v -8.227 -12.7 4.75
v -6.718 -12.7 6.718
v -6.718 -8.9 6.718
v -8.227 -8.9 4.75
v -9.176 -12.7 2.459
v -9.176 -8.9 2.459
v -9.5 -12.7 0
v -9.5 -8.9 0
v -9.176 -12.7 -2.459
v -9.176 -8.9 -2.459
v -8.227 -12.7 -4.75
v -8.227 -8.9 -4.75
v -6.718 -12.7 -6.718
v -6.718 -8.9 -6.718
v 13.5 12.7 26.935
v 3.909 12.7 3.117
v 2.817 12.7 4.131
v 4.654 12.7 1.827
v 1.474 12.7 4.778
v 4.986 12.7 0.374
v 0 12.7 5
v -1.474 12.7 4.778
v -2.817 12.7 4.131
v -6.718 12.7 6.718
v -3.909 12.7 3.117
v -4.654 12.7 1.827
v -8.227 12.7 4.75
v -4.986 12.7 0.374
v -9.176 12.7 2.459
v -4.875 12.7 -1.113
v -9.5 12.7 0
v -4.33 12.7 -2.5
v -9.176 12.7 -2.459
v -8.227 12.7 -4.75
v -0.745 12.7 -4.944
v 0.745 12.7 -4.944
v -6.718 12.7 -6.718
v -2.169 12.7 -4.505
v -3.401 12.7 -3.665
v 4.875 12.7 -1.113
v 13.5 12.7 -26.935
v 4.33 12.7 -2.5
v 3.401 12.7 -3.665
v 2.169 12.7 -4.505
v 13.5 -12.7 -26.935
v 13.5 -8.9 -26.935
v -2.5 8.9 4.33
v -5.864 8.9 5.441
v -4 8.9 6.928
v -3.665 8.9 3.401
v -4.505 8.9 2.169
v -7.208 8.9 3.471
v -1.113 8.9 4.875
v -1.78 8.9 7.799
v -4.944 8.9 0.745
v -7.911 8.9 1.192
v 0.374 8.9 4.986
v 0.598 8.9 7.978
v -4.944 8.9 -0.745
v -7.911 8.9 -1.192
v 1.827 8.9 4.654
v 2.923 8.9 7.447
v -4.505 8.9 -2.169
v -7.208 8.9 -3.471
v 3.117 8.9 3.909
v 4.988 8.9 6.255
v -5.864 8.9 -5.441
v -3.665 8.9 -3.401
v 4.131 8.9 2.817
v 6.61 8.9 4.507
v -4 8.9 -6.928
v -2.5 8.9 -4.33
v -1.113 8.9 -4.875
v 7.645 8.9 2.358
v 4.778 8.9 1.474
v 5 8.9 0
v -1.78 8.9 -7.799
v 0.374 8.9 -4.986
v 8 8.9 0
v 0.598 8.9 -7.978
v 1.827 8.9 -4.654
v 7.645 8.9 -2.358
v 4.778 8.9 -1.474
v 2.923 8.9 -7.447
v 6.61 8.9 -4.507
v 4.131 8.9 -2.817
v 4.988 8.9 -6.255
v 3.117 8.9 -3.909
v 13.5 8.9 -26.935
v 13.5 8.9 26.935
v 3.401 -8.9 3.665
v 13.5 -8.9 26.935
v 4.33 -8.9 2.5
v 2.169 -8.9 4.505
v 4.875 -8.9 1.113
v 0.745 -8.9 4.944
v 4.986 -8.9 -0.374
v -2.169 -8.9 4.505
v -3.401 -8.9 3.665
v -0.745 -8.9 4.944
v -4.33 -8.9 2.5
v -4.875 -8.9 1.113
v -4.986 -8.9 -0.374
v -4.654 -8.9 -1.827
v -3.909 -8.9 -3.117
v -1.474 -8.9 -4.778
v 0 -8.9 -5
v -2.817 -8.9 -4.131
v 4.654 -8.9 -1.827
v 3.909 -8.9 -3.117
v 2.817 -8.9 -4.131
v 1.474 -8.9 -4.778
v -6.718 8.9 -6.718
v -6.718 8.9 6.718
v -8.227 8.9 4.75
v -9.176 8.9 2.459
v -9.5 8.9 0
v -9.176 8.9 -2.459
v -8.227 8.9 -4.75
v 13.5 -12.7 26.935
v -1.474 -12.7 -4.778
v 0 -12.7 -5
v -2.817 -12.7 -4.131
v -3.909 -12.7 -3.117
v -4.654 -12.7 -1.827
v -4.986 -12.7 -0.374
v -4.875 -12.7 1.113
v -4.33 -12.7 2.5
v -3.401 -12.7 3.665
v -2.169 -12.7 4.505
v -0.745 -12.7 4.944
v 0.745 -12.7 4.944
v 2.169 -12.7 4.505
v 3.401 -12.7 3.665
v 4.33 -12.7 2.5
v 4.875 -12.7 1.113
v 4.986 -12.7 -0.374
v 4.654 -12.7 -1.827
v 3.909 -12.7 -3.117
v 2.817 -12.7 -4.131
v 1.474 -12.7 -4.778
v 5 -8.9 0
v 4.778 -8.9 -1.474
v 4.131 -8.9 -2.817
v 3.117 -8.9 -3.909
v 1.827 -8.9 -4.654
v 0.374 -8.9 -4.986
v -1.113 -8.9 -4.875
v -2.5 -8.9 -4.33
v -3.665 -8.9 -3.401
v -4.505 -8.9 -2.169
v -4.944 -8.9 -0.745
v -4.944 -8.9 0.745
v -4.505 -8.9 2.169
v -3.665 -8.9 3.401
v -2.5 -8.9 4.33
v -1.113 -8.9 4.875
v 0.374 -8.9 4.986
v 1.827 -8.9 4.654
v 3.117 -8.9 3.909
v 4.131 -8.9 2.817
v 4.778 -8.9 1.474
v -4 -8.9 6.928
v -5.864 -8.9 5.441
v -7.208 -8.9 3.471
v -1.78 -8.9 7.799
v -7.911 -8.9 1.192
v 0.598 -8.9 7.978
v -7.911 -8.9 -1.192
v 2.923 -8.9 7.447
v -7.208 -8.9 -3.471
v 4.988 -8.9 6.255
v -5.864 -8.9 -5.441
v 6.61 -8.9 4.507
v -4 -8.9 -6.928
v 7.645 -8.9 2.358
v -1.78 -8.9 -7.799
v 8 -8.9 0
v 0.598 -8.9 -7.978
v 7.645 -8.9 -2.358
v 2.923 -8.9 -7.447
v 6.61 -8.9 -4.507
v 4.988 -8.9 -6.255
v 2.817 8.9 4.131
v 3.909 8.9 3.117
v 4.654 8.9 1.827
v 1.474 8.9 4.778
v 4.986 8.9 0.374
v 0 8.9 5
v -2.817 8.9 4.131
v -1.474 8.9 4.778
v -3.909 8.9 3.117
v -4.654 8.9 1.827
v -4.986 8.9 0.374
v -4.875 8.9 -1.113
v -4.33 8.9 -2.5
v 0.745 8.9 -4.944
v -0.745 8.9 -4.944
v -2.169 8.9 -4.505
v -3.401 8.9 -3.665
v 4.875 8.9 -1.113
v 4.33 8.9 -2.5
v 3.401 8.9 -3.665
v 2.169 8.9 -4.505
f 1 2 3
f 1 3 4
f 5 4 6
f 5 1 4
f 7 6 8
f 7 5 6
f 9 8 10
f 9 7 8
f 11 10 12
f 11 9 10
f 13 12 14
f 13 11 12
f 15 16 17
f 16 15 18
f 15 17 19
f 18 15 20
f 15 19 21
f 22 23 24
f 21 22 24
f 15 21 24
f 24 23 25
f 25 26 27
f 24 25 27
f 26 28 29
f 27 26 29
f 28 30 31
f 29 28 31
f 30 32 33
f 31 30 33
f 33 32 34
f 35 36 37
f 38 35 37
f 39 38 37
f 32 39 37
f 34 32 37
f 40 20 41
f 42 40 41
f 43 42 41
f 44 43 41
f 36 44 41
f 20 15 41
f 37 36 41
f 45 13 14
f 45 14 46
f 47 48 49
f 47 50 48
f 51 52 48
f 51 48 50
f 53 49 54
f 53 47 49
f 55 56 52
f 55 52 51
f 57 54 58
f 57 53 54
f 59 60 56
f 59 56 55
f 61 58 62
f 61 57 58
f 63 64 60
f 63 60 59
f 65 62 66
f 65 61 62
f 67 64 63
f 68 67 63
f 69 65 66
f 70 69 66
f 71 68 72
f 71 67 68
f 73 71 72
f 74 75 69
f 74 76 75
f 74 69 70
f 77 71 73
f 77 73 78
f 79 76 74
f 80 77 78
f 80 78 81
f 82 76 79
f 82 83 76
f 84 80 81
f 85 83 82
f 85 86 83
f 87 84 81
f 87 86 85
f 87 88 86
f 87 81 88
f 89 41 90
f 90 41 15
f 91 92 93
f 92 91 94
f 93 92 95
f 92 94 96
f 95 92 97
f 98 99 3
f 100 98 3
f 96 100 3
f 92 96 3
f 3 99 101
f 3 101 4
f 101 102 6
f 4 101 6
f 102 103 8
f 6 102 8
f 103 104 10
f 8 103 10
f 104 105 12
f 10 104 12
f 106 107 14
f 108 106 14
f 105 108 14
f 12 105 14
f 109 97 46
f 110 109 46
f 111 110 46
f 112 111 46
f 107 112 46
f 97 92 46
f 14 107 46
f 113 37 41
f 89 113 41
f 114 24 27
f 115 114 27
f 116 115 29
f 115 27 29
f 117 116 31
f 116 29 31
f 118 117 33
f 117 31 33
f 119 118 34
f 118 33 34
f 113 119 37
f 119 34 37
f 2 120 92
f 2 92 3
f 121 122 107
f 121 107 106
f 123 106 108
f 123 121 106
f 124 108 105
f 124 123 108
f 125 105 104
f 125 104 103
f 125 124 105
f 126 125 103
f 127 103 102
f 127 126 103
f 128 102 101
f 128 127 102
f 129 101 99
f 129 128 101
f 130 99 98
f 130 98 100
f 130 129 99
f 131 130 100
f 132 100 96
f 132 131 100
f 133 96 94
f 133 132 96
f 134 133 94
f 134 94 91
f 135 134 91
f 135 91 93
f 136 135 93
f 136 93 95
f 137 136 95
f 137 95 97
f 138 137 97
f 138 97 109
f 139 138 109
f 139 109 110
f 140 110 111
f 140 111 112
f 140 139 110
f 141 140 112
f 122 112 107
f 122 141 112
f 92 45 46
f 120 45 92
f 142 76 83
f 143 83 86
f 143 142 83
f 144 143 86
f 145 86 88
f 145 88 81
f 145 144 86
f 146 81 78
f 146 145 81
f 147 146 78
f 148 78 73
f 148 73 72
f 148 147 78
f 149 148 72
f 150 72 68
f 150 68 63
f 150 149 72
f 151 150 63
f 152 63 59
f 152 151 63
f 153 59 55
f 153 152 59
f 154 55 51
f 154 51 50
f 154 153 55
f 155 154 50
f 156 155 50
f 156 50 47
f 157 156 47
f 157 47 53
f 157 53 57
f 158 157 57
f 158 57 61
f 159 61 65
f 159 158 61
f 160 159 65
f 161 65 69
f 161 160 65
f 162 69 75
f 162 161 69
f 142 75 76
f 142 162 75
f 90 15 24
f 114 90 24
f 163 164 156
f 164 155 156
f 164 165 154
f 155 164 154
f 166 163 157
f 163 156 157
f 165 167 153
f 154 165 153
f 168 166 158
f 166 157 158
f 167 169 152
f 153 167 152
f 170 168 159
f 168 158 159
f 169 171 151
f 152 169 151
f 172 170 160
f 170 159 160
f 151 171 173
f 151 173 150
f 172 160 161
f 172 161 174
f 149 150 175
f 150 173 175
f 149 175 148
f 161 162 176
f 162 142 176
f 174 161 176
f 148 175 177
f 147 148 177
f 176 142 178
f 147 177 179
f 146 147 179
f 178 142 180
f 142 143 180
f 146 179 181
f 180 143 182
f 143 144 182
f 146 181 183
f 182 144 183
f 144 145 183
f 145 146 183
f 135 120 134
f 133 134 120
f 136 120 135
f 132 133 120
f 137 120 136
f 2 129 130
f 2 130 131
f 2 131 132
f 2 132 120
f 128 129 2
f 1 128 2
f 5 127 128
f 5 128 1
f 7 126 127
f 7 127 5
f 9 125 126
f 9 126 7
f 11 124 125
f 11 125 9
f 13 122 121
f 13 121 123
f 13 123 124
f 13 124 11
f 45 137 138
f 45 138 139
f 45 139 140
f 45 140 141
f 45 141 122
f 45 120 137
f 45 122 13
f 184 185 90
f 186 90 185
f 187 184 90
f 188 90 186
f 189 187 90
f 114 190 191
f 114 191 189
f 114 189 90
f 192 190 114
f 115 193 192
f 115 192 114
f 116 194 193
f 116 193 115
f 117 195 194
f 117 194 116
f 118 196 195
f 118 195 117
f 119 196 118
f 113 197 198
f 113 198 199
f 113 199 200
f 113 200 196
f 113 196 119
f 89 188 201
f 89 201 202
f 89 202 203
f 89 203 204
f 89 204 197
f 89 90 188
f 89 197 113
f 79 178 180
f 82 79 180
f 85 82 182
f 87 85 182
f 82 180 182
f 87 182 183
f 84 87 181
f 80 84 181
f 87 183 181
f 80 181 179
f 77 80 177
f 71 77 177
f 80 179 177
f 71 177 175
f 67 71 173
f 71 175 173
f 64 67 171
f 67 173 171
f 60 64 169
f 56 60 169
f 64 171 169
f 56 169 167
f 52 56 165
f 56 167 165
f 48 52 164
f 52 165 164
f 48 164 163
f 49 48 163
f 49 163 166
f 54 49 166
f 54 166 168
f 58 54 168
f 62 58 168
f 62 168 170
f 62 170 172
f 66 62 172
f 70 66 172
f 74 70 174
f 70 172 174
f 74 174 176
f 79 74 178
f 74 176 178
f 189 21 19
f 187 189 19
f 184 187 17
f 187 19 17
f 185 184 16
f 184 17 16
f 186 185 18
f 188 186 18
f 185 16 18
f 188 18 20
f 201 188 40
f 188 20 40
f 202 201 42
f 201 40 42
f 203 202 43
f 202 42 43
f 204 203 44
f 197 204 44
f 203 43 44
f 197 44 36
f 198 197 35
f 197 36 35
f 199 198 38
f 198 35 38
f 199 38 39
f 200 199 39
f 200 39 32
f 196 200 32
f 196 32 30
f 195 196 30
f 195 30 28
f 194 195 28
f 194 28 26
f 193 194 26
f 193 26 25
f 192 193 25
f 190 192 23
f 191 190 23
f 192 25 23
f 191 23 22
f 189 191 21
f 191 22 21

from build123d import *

# Parameters (mm, degrees)
BOSS_EXTRUDE1_START       = 12.7
SKETCH1_R                 = 5
BOSS_EXTRUDE1_DEPTH       = 3.8
BOSS_EXTRUDE2_START       = -12.7
SKETCH1_2_R               = 5
BOSS_EXTRUDE2_DEPTH       = 3.8
BOSS_EXTRUDE3_START       = -8.9
BOSS_EXTRUDE3_OUTLINE_R   = 8
BOSS_EXTRUDE3_OUTLINE_R_2 = 5
BOSS_EXTRUDE3_DEPTH       = 17.8


# Read off the part's stored shape, not the designer's step: Boss-Extrude3
with BuildPart() as part:
    # Sketch1 → Boss-Extrude1 (new body)
    with BuildSketch(Plane(origin=(0, 0, 0), x_dir=(1, 0, 0), z_dir=(0, 1, 0)).offset(BOSS_EXTRUDE1_START)):
        with BuildLine():
            Line((13.5, 26.935028843), (13.5, -26.935028843))
            Line((13.5, -26.935028843), (-6.717514421, -6.717514421))
            ThreePointArc((-6.717514421, -6.717514421), (-9.5, 0), (-6.717514421, 6.717514421))
            Line((-6.717514421, 6.717514421), (13.5, 26.935028843))
        make_face()
        with Locations(Location((0, 0, 0), (0, 0, 270))):
            Circle(SKETCH1_R, mode=Mode.SUBTRACT)
    extrude(amount=-BOSS_EXTRUDE1_DEPTH)


with BuildPart() as body_2:
    # Sketch1<2> → Boss-Extrude2 (new body)
    with BuildSketch(Plane(origin=(0, 0, 0), x_dir=(1, 0, 0), z_dir=(0, 1, 0)).offset(BOSS_EXTRUDE2_START)):
        with BuildLine():
            Line((13.5, 26.935028843), (13.5, -26.935028843))
            Line((13.5, -26.935028843), (-6.717514421, -6.717514421))
            ThreePointArc((-6.717514421, -6.717514421), (-9.5, 0), (-6.717514421, 6.717514421))
            Line((-6.717514421, 6.717514421), (13.5, 26.935028843))
        make_face()
        with Locations(Location((0, 0, 0), (0, 0, 90))):
            Circle(SKETCH1_2_R, mode=Mode.SUBTRACT)
    extrude(amount=BOSS_EXTRUDE2_DEPTH)


with BuildPart() as body_3:
    # Boss-Extrude3 outline → Boss-Extrude3 (new body)
    with BuildSketch(Plane(origin=(0, 0, 0), x_dir=(1, 0, 0), z_dir=(0, 1, 0)).offset(BOSS_EXTRUDE3_START)):
        Circle(BOSS_EXTRUDE3_OUTLINE_R)
        Circle(BOSS_EXTRUDE3_OUTLINE_R_2, mode=Mode.SUBTRACT)
    extrude(amount=BOSS_EXTRUDE3_DEPTH)


solid = Compound([part.part, body_2.part, body_3.part])
